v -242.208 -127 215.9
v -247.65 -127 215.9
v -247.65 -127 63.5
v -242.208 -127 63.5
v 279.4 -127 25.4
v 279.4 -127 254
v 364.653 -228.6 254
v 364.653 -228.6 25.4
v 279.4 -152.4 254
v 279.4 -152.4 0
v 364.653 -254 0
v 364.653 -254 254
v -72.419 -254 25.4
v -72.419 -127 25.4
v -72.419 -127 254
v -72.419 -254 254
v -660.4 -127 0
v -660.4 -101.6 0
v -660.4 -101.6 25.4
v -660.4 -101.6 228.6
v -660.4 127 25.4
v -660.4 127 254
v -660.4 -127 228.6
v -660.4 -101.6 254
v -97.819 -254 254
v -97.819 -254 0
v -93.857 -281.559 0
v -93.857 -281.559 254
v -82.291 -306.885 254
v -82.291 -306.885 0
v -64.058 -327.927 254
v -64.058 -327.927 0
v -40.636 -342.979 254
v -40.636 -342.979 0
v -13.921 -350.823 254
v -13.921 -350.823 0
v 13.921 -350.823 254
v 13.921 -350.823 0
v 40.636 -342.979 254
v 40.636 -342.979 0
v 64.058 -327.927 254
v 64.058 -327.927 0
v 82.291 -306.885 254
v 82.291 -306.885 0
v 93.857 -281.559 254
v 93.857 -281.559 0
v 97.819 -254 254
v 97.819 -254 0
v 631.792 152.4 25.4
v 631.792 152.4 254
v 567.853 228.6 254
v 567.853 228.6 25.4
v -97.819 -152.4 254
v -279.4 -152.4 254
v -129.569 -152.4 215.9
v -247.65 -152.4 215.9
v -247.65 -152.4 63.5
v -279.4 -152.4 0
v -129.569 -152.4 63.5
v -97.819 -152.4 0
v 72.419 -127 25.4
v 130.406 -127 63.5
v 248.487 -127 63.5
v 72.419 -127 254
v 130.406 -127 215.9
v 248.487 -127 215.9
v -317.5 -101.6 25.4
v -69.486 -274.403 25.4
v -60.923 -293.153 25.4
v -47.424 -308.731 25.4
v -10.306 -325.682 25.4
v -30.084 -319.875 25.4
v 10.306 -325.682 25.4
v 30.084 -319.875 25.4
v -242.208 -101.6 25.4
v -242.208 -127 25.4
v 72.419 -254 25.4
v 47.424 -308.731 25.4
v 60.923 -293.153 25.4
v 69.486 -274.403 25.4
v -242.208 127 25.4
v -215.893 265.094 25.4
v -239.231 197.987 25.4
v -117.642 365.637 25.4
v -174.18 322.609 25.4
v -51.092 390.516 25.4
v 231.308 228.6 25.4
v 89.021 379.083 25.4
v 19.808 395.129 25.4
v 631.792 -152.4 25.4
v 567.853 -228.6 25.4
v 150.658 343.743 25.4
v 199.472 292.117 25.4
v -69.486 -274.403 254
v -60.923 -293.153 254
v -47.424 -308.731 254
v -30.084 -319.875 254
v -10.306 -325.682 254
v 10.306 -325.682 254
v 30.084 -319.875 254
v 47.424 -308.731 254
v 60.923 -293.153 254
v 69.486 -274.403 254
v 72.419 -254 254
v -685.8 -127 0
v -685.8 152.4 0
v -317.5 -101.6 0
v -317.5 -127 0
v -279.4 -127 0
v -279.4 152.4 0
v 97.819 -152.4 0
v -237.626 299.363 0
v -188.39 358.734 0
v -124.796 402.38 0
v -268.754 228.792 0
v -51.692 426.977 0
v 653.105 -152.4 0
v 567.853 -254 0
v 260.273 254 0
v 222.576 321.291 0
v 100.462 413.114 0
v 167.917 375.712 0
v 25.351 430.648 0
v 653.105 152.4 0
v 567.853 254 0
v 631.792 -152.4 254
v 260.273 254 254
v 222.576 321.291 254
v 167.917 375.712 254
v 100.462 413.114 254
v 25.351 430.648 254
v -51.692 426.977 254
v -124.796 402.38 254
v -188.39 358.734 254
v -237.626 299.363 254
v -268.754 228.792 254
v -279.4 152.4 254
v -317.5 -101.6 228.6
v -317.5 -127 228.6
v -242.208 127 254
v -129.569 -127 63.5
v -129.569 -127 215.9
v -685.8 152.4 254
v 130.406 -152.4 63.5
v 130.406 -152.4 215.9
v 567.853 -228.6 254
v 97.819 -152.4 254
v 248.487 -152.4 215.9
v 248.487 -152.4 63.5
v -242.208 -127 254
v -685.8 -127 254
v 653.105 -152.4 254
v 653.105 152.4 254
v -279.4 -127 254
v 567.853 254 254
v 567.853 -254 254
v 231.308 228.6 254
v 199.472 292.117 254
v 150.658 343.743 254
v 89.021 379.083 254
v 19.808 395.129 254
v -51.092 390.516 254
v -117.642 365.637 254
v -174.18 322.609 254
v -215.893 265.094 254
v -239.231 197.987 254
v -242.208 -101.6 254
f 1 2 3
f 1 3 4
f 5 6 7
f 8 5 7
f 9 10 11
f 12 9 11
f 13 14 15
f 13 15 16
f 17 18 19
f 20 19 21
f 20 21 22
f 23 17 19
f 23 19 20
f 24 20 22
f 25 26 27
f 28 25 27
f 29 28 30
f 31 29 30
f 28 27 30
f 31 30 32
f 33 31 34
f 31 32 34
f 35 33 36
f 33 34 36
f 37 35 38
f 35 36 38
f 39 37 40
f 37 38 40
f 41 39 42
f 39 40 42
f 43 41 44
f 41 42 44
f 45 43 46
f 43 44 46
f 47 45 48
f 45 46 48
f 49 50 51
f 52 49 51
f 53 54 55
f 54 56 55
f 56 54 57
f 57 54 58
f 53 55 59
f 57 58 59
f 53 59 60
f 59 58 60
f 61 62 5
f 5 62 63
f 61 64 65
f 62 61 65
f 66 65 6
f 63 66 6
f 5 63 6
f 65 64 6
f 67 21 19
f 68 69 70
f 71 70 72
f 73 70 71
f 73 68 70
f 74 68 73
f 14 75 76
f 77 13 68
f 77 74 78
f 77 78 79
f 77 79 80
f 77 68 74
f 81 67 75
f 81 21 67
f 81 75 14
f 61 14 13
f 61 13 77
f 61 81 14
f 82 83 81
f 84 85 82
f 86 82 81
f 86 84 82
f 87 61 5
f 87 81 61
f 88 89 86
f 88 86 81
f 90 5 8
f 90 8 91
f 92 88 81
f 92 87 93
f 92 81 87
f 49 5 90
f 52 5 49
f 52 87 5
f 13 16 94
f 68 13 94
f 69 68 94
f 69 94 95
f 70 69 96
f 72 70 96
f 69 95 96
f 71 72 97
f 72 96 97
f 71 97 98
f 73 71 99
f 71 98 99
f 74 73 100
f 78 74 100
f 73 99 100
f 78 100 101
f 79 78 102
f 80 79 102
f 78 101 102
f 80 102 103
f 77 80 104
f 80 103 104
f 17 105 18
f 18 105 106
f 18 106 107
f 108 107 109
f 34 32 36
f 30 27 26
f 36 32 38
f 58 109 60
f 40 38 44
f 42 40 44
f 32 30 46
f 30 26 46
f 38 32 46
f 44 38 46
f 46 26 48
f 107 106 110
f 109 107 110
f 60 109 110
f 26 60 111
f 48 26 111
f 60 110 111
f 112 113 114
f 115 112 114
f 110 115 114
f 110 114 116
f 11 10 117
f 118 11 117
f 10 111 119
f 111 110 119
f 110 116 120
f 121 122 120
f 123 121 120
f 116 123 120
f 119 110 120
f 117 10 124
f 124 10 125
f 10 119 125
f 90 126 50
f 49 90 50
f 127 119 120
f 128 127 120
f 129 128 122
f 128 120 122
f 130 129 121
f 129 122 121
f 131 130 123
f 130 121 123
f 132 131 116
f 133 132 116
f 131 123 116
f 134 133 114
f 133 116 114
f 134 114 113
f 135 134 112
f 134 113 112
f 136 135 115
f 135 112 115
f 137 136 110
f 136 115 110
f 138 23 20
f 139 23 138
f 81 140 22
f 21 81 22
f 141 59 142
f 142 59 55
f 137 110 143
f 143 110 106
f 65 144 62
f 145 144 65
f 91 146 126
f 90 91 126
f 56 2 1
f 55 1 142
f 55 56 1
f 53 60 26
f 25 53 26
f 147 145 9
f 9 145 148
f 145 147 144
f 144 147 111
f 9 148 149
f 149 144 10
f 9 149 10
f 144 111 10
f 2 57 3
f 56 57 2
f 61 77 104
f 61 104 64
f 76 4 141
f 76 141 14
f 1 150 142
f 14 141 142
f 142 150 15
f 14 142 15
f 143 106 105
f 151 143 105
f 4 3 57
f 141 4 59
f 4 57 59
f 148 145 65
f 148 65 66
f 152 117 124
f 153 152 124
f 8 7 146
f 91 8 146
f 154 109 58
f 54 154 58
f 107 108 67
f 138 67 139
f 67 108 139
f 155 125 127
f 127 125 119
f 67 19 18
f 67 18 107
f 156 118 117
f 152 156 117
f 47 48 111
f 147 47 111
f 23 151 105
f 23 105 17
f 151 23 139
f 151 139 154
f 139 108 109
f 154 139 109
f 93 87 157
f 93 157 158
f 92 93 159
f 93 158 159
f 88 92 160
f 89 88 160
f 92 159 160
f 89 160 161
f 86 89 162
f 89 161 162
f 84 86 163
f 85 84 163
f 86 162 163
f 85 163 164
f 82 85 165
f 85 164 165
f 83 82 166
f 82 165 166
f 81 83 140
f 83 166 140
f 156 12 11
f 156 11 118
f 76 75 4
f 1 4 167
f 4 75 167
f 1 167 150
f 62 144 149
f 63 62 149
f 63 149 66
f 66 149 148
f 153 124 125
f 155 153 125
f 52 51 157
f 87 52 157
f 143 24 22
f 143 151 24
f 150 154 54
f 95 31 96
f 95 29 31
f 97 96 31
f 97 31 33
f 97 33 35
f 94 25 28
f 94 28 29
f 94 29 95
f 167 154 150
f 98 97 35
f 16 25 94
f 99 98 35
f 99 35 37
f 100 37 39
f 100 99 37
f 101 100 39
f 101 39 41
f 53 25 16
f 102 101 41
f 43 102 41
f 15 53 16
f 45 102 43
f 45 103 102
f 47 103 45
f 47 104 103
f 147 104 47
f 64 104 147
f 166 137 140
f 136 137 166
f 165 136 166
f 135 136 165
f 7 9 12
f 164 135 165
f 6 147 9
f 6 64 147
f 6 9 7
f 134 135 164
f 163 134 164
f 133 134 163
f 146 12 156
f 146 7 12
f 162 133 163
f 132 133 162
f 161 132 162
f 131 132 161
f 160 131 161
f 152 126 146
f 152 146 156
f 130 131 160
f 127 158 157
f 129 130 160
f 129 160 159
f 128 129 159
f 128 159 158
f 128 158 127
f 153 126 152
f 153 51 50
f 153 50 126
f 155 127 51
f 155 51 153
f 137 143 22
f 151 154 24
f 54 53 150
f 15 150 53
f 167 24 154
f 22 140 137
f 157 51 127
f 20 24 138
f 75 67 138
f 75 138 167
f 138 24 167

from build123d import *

# Parameters (mm, degrees)
F1_DEPTH = 254
F3_DEPTH = 228.6
F5_W     = 118.080845
F5_H     = 152.4
F4_W     = 342.9
F4_H     = 228.6
F6_DEPTH = 25.4


with BuildPart() as f1:
    # F0 (on Top) → F1 (new body)
    with BuildSketch(Plane.XY):
        with BuildLine():
            Line((97.819155, -152.4), (279.4, -152.4))
            Line((279.4, -152.4), (364.652523, -254))
            Line((364.652523, -254), (567.852523, -254))
            Line((567.852523, -254), (653.105045, -152.4))
            Line((653.105045, -152.4), (653.105045, 152.4))
            Line((653.105045, 152.4), (567.852523, 254))
            Line((567.852523, 254), (260.272549, 254))
            ThreePointArc((260.272549, 254), (-51.692406, 426.976501), (-279.4, 152.4))
            Line((-279.4, 152.4), (-685.8, 152.4))
            Line((-685.8, 152.4), (-685.8, -127))
            Line((-685.8, -127), (-279.4, -127))
            Line((-279.4, -127), (-279.4, -152.4))
            Line((-279.4, -152.4), (-97.819155, -152.4))
            Line((-97.819155, -152.4), (-97.819155, -254))
            ThreePointArc((-97.819155, -254), (0, -351.819155), (97.819155, -254))
            Line((97.819155, -254), (97.819155, -152.4))
        make_face()
    extrude(amount=F1_DEPTH)

    # F2 (on face) → F3 (cut)
    with BuildSketch(Plane.XY.offset(254)):
        with BuildLine():
            Line((72.419155, -127), (242.20781, -127))
            Line((242.20781, -127), (279.4, -127))
            Line((279.4, -127), (364.652523, -228.6))
            Line((364.652523, -228.6), (567.852523, -228.6))
            Line((567.852523, -228.6), (631.791914, -152.4))
            Line((631.791914, -152.4), (631.791914, 152.4))
            Line((631.791914, 152.4), (567.852523, 228.6))
            Line((567.852523, 228.6), (231.307897, 228.6))
            ThreePointArc((231.307897, 228.6), (-51.091506, 390.516445), (-242.20781, 127))
            Line((-242.20781, 127), (-660.4, 127))
            Line((-660.4, 127), (-660.4, -101.6))
            Line((-660.4, -101.6), (-242.20781, -101.6))
            Line((-242.20781, -101.6), (-242.20781, -127))
            Line((-242.20781, -127), (-72.419155, -127))
            Line((-72.419155, -127), (-72.419155, -254))
            ThreePointArc((-72.419155, -254), (0, -326.419155), (72.419155, -254))
            Line((72.419155, -254), (72.419155, -127))
        make_face()
    extrude(amount=-F3_DEPTH, mode=Mode.SUBTRACT)

    # F5 (on face) + F4 (on face) → F6 (cut)
    with BuildSketch(Plane.XZ.offset(152.4)):
        with Locations((-188.609578, 139.7)):
            Rectangle(F5_W, F5_H)
        with Locations((189.446623, 139.7)):
            Rectangle(F5_W, F5_H)
    with BuildSketch(Plane.XZ.offset(127)):
        with Locations((-488.95, 114.3)):
            Rectangle(F4_W, F4_H)
    extrude(amount=-F6_DEPTH, mode=Mode.SUBTRACT)


solid = f1.part
